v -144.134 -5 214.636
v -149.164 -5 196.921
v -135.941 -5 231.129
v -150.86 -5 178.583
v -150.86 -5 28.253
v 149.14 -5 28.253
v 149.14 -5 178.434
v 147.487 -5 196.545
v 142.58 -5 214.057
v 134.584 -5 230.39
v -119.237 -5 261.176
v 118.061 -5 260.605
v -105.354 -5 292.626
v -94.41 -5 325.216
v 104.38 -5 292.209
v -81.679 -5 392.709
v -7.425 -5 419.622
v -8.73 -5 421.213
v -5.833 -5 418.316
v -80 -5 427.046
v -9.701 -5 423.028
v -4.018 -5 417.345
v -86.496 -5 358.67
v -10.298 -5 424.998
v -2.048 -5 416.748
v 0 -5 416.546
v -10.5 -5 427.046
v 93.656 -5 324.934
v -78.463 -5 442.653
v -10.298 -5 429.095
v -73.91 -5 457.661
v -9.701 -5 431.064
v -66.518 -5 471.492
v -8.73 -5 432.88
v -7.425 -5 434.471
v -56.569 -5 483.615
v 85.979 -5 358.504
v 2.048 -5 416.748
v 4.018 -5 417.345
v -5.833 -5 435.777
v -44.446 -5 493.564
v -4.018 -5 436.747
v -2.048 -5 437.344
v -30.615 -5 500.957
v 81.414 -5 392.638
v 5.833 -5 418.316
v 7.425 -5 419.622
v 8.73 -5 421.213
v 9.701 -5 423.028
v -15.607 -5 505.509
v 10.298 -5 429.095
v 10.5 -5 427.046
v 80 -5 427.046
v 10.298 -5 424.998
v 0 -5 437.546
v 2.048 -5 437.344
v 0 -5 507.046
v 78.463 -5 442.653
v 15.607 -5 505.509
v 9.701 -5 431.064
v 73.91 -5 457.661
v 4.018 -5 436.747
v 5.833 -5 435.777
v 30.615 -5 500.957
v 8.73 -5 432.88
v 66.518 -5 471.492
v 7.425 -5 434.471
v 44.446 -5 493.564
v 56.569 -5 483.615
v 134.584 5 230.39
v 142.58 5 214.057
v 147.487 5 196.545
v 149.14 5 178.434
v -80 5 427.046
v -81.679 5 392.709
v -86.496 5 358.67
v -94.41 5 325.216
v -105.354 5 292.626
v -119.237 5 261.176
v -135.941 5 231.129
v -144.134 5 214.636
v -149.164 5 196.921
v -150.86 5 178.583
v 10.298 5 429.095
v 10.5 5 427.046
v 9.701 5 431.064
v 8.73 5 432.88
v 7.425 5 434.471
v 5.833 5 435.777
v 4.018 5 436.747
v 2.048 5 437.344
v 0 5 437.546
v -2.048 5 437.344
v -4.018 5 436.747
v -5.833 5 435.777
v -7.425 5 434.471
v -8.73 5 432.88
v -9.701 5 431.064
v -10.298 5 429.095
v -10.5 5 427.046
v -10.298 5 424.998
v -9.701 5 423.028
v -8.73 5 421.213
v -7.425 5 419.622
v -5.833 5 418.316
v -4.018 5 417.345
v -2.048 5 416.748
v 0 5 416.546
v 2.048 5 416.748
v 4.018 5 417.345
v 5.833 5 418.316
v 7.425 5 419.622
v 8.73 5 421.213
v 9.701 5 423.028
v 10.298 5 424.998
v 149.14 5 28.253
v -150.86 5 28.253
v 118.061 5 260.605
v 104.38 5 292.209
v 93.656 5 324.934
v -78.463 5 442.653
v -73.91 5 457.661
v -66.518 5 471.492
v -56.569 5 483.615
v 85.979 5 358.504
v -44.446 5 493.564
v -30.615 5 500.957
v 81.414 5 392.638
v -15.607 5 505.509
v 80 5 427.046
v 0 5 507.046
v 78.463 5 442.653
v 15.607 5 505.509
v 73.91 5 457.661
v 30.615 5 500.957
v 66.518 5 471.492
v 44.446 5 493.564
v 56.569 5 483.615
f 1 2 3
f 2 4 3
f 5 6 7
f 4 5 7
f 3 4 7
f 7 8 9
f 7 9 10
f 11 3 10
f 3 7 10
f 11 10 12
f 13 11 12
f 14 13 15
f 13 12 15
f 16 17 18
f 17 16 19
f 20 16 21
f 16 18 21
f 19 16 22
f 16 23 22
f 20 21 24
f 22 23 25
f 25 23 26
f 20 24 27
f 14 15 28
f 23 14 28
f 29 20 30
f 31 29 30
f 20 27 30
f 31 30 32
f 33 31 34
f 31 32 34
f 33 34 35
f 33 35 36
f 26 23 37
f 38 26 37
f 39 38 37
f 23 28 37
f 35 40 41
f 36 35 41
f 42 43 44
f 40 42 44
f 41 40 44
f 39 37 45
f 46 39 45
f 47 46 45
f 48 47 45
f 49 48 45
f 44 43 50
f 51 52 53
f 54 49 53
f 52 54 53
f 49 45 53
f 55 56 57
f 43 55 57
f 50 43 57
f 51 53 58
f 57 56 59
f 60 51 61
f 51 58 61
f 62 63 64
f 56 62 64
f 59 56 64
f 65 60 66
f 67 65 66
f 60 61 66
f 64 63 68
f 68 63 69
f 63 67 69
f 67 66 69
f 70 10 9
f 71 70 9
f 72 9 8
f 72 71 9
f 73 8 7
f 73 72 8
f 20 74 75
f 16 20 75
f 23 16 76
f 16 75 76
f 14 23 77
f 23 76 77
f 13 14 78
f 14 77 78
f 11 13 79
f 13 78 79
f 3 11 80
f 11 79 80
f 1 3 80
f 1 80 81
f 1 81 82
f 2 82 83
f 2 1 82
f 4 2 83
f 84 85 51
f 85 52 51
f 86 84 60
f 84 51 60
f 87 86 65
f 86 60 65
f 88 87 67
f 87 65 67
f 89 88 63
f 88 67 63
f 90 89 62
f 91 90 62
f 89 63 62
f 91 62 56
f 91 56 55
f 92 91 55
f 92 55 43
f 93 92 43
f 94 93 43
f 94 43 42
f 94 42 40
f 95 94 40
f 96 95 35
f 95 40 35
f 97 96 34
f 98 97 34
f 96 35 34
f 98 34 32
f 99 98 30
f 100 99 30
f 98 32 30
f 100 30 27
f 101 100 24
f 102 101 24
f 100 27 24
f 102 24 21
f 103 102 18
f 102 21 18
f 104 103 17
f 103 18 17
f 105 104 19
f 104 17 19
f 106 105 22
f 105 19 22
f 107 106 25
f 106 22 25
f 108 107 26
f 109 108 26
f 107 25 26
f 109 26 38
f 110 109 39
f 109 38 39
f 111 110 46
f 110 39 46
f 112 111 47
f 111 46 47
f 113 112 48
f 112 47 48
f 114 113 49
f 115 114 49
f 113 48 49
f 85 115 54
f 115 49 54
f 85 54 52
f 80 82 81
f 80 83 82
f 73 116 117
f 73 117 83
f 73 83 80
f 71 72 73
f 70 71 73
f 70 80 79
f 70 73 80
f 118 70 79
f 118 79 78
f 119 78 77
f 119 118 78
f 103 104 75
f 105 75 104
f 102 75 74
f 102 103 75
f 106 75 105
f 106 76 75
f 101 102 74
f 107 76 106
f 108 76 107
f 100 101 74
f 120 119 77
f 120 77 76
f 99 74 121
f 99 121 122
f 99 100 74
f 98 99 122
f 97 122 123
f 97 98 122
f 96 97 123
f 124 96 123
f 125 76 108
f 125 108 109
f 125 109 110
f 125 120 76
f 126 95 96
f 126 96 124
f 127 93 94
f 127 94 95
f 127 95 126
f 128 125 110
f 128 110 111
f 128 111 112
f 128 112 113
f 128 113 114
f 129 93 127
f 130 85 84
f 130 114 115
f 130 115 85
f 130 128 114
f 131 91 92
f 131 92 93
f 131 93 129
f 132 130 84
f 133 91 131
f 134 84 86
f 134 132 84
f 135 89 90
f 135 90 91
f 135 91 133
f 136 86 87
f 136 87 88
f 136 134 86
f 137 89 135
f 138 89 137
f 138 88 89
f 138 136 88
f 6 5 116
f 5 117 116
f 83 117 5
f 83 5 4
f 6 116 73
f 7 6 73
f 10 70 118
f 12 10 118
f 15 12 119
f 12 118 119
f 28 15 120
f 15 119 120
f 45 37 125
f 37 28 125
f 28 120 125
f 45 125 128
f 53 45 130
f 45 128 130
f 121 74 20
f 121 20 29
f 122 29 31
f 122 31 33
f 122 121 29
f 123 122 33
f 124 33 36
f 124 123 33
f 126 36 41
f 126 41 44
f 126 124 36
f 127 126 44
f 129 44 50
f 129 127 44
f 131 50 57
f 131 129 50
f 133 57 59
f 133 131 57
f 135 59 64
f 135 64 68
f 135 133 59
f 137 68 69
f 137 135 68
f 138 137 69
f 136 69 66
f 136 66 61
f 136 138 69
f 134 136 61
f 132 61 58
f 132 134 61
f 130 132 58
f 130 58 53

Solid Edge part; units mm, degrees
sketch "Sketch1" plane through (0, 0, 0) normal (0, -1, 0) x (1, 0, 0)
  arc A0 (80, 427.0462) -> (149.1404, 208.2529) centre (454.9956, 425.2266) ccw
  line L0 (149.1404, 28.2529) -> (149.1404, 208.2529)
  line L1 (-150.8596, 28.2529) -> (149.1404, 28.2529)
  line L2 (-150.8596, 28.2529) -> (-150.8596, 208.8033)
  arc A1 (-80, 427.0462) -> (-150.8596, 208.8033) centre (-454.9983, 428.1766) cw
  arc A2 (-80, 427.0462) -> (80, 427.0462) centre (0, 427.0462) cw
extrude "ProtrusioneEstrusa_1" add sketch "Sketch1" along normal mid plane 10
fillet "Rotondo_1" radius 100 2 edges at (149.1404, 0, 208.2529) (-150.8596, 0, 208.8033)
sketch "Sketch2" plane through (-0.8596, -5, 267.6495) normal (0, -1, 0) x (1, 0, 0)
  circle A0 centre (0.8596, 159.3967) radius 10.5
extrude "Cutout1" cut sketch "Sketch2" against normal through all
properties material "Policarbonato"
